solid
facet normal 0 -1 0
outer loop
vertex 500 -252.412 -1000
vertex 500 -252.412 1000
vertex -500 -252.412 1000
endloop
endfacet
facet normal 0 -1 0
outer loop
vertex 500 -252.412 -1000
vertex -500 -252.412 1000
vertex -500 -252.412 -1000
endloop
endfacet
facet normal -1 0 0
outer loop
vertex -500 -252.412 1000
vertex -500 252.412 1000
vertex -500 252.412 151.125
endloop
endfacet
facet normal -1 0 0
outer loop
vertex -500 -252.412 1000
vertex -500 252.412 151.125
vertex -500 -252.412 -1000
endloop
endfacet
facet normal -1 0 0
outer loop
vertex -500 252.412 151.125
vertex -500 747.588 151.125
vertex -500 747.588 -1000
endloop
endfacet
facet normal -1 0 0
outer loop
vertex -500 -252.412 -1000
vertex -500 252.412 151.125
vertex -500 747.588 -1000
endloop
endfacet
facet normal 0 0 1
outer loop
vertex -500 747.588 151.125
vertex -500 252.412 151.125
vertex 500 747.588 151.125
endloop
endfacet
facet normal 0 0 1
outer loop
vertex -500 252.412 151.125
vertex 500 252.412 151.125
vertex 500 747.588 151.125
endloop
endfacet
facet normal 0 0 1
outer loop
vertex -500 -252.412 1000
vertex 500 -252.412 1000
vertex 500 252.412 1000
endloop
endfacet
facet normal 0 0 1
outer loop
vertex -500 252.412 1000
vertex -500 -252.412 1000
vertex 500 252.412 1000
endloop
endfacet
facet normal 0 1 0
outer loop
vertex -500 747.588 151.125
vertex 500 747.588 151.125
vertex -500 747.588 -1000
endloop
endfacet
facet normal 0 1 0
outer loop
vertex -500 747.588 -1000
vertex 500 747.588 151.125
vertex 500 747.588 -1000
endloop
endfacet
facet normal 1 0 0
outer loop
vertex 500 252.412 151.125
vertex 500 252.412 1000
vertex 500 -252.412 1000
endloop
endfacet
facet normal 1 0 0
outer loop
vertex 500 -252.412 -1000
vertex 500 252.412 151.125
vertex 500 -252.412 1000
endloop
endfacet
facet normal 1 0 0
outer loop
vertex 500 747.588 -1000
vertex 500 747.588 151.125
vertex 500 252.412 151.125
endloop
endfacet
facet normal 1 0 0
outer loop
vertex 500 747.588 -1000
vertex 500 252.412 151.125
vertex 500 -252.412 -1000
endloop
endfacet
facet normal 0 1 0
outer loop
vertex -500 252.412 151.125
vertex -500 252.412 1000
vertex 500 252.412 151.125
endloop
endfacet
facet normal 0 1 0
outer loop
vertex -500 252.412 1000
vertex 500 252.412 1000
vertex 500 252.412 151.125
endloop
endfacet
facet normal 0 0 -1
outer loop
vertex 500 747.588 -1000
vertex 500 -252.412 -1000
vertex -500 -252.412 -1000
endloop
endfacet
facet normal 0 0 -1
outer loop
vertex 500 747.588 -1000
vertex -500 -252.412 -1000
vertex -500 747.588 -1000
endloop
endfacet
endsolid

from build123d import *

# Parameters (mm, degrees)
SKETCH1_W           = 2000
SKETCH1_H           = 504.823151126
SKETCH1_W_2         = 1151.125401929
SKETCH1_H_2         = 495.176848874
BOSS_EXTRUDE1_DEPTH = 500


with BuildPart() as part:
    # Sketch1 → Boss-Extrude1 (new, symmetric)
    with BuildSketch(Plane(origin=(0, 0, 0), x_dir=(0, 0, -1), z_dir=(1, 0, 0))):
        Rectangle(SKETCH1_W, SKETCH1_H)
        with Locations((424.437299036, 500)):
            Rectangle(SKETCH1_W_2, SKETCH1_H_2)
    extrude(amount=BOSS_EXTRUDE1_DEPTH, both=True)


solid = part.part
